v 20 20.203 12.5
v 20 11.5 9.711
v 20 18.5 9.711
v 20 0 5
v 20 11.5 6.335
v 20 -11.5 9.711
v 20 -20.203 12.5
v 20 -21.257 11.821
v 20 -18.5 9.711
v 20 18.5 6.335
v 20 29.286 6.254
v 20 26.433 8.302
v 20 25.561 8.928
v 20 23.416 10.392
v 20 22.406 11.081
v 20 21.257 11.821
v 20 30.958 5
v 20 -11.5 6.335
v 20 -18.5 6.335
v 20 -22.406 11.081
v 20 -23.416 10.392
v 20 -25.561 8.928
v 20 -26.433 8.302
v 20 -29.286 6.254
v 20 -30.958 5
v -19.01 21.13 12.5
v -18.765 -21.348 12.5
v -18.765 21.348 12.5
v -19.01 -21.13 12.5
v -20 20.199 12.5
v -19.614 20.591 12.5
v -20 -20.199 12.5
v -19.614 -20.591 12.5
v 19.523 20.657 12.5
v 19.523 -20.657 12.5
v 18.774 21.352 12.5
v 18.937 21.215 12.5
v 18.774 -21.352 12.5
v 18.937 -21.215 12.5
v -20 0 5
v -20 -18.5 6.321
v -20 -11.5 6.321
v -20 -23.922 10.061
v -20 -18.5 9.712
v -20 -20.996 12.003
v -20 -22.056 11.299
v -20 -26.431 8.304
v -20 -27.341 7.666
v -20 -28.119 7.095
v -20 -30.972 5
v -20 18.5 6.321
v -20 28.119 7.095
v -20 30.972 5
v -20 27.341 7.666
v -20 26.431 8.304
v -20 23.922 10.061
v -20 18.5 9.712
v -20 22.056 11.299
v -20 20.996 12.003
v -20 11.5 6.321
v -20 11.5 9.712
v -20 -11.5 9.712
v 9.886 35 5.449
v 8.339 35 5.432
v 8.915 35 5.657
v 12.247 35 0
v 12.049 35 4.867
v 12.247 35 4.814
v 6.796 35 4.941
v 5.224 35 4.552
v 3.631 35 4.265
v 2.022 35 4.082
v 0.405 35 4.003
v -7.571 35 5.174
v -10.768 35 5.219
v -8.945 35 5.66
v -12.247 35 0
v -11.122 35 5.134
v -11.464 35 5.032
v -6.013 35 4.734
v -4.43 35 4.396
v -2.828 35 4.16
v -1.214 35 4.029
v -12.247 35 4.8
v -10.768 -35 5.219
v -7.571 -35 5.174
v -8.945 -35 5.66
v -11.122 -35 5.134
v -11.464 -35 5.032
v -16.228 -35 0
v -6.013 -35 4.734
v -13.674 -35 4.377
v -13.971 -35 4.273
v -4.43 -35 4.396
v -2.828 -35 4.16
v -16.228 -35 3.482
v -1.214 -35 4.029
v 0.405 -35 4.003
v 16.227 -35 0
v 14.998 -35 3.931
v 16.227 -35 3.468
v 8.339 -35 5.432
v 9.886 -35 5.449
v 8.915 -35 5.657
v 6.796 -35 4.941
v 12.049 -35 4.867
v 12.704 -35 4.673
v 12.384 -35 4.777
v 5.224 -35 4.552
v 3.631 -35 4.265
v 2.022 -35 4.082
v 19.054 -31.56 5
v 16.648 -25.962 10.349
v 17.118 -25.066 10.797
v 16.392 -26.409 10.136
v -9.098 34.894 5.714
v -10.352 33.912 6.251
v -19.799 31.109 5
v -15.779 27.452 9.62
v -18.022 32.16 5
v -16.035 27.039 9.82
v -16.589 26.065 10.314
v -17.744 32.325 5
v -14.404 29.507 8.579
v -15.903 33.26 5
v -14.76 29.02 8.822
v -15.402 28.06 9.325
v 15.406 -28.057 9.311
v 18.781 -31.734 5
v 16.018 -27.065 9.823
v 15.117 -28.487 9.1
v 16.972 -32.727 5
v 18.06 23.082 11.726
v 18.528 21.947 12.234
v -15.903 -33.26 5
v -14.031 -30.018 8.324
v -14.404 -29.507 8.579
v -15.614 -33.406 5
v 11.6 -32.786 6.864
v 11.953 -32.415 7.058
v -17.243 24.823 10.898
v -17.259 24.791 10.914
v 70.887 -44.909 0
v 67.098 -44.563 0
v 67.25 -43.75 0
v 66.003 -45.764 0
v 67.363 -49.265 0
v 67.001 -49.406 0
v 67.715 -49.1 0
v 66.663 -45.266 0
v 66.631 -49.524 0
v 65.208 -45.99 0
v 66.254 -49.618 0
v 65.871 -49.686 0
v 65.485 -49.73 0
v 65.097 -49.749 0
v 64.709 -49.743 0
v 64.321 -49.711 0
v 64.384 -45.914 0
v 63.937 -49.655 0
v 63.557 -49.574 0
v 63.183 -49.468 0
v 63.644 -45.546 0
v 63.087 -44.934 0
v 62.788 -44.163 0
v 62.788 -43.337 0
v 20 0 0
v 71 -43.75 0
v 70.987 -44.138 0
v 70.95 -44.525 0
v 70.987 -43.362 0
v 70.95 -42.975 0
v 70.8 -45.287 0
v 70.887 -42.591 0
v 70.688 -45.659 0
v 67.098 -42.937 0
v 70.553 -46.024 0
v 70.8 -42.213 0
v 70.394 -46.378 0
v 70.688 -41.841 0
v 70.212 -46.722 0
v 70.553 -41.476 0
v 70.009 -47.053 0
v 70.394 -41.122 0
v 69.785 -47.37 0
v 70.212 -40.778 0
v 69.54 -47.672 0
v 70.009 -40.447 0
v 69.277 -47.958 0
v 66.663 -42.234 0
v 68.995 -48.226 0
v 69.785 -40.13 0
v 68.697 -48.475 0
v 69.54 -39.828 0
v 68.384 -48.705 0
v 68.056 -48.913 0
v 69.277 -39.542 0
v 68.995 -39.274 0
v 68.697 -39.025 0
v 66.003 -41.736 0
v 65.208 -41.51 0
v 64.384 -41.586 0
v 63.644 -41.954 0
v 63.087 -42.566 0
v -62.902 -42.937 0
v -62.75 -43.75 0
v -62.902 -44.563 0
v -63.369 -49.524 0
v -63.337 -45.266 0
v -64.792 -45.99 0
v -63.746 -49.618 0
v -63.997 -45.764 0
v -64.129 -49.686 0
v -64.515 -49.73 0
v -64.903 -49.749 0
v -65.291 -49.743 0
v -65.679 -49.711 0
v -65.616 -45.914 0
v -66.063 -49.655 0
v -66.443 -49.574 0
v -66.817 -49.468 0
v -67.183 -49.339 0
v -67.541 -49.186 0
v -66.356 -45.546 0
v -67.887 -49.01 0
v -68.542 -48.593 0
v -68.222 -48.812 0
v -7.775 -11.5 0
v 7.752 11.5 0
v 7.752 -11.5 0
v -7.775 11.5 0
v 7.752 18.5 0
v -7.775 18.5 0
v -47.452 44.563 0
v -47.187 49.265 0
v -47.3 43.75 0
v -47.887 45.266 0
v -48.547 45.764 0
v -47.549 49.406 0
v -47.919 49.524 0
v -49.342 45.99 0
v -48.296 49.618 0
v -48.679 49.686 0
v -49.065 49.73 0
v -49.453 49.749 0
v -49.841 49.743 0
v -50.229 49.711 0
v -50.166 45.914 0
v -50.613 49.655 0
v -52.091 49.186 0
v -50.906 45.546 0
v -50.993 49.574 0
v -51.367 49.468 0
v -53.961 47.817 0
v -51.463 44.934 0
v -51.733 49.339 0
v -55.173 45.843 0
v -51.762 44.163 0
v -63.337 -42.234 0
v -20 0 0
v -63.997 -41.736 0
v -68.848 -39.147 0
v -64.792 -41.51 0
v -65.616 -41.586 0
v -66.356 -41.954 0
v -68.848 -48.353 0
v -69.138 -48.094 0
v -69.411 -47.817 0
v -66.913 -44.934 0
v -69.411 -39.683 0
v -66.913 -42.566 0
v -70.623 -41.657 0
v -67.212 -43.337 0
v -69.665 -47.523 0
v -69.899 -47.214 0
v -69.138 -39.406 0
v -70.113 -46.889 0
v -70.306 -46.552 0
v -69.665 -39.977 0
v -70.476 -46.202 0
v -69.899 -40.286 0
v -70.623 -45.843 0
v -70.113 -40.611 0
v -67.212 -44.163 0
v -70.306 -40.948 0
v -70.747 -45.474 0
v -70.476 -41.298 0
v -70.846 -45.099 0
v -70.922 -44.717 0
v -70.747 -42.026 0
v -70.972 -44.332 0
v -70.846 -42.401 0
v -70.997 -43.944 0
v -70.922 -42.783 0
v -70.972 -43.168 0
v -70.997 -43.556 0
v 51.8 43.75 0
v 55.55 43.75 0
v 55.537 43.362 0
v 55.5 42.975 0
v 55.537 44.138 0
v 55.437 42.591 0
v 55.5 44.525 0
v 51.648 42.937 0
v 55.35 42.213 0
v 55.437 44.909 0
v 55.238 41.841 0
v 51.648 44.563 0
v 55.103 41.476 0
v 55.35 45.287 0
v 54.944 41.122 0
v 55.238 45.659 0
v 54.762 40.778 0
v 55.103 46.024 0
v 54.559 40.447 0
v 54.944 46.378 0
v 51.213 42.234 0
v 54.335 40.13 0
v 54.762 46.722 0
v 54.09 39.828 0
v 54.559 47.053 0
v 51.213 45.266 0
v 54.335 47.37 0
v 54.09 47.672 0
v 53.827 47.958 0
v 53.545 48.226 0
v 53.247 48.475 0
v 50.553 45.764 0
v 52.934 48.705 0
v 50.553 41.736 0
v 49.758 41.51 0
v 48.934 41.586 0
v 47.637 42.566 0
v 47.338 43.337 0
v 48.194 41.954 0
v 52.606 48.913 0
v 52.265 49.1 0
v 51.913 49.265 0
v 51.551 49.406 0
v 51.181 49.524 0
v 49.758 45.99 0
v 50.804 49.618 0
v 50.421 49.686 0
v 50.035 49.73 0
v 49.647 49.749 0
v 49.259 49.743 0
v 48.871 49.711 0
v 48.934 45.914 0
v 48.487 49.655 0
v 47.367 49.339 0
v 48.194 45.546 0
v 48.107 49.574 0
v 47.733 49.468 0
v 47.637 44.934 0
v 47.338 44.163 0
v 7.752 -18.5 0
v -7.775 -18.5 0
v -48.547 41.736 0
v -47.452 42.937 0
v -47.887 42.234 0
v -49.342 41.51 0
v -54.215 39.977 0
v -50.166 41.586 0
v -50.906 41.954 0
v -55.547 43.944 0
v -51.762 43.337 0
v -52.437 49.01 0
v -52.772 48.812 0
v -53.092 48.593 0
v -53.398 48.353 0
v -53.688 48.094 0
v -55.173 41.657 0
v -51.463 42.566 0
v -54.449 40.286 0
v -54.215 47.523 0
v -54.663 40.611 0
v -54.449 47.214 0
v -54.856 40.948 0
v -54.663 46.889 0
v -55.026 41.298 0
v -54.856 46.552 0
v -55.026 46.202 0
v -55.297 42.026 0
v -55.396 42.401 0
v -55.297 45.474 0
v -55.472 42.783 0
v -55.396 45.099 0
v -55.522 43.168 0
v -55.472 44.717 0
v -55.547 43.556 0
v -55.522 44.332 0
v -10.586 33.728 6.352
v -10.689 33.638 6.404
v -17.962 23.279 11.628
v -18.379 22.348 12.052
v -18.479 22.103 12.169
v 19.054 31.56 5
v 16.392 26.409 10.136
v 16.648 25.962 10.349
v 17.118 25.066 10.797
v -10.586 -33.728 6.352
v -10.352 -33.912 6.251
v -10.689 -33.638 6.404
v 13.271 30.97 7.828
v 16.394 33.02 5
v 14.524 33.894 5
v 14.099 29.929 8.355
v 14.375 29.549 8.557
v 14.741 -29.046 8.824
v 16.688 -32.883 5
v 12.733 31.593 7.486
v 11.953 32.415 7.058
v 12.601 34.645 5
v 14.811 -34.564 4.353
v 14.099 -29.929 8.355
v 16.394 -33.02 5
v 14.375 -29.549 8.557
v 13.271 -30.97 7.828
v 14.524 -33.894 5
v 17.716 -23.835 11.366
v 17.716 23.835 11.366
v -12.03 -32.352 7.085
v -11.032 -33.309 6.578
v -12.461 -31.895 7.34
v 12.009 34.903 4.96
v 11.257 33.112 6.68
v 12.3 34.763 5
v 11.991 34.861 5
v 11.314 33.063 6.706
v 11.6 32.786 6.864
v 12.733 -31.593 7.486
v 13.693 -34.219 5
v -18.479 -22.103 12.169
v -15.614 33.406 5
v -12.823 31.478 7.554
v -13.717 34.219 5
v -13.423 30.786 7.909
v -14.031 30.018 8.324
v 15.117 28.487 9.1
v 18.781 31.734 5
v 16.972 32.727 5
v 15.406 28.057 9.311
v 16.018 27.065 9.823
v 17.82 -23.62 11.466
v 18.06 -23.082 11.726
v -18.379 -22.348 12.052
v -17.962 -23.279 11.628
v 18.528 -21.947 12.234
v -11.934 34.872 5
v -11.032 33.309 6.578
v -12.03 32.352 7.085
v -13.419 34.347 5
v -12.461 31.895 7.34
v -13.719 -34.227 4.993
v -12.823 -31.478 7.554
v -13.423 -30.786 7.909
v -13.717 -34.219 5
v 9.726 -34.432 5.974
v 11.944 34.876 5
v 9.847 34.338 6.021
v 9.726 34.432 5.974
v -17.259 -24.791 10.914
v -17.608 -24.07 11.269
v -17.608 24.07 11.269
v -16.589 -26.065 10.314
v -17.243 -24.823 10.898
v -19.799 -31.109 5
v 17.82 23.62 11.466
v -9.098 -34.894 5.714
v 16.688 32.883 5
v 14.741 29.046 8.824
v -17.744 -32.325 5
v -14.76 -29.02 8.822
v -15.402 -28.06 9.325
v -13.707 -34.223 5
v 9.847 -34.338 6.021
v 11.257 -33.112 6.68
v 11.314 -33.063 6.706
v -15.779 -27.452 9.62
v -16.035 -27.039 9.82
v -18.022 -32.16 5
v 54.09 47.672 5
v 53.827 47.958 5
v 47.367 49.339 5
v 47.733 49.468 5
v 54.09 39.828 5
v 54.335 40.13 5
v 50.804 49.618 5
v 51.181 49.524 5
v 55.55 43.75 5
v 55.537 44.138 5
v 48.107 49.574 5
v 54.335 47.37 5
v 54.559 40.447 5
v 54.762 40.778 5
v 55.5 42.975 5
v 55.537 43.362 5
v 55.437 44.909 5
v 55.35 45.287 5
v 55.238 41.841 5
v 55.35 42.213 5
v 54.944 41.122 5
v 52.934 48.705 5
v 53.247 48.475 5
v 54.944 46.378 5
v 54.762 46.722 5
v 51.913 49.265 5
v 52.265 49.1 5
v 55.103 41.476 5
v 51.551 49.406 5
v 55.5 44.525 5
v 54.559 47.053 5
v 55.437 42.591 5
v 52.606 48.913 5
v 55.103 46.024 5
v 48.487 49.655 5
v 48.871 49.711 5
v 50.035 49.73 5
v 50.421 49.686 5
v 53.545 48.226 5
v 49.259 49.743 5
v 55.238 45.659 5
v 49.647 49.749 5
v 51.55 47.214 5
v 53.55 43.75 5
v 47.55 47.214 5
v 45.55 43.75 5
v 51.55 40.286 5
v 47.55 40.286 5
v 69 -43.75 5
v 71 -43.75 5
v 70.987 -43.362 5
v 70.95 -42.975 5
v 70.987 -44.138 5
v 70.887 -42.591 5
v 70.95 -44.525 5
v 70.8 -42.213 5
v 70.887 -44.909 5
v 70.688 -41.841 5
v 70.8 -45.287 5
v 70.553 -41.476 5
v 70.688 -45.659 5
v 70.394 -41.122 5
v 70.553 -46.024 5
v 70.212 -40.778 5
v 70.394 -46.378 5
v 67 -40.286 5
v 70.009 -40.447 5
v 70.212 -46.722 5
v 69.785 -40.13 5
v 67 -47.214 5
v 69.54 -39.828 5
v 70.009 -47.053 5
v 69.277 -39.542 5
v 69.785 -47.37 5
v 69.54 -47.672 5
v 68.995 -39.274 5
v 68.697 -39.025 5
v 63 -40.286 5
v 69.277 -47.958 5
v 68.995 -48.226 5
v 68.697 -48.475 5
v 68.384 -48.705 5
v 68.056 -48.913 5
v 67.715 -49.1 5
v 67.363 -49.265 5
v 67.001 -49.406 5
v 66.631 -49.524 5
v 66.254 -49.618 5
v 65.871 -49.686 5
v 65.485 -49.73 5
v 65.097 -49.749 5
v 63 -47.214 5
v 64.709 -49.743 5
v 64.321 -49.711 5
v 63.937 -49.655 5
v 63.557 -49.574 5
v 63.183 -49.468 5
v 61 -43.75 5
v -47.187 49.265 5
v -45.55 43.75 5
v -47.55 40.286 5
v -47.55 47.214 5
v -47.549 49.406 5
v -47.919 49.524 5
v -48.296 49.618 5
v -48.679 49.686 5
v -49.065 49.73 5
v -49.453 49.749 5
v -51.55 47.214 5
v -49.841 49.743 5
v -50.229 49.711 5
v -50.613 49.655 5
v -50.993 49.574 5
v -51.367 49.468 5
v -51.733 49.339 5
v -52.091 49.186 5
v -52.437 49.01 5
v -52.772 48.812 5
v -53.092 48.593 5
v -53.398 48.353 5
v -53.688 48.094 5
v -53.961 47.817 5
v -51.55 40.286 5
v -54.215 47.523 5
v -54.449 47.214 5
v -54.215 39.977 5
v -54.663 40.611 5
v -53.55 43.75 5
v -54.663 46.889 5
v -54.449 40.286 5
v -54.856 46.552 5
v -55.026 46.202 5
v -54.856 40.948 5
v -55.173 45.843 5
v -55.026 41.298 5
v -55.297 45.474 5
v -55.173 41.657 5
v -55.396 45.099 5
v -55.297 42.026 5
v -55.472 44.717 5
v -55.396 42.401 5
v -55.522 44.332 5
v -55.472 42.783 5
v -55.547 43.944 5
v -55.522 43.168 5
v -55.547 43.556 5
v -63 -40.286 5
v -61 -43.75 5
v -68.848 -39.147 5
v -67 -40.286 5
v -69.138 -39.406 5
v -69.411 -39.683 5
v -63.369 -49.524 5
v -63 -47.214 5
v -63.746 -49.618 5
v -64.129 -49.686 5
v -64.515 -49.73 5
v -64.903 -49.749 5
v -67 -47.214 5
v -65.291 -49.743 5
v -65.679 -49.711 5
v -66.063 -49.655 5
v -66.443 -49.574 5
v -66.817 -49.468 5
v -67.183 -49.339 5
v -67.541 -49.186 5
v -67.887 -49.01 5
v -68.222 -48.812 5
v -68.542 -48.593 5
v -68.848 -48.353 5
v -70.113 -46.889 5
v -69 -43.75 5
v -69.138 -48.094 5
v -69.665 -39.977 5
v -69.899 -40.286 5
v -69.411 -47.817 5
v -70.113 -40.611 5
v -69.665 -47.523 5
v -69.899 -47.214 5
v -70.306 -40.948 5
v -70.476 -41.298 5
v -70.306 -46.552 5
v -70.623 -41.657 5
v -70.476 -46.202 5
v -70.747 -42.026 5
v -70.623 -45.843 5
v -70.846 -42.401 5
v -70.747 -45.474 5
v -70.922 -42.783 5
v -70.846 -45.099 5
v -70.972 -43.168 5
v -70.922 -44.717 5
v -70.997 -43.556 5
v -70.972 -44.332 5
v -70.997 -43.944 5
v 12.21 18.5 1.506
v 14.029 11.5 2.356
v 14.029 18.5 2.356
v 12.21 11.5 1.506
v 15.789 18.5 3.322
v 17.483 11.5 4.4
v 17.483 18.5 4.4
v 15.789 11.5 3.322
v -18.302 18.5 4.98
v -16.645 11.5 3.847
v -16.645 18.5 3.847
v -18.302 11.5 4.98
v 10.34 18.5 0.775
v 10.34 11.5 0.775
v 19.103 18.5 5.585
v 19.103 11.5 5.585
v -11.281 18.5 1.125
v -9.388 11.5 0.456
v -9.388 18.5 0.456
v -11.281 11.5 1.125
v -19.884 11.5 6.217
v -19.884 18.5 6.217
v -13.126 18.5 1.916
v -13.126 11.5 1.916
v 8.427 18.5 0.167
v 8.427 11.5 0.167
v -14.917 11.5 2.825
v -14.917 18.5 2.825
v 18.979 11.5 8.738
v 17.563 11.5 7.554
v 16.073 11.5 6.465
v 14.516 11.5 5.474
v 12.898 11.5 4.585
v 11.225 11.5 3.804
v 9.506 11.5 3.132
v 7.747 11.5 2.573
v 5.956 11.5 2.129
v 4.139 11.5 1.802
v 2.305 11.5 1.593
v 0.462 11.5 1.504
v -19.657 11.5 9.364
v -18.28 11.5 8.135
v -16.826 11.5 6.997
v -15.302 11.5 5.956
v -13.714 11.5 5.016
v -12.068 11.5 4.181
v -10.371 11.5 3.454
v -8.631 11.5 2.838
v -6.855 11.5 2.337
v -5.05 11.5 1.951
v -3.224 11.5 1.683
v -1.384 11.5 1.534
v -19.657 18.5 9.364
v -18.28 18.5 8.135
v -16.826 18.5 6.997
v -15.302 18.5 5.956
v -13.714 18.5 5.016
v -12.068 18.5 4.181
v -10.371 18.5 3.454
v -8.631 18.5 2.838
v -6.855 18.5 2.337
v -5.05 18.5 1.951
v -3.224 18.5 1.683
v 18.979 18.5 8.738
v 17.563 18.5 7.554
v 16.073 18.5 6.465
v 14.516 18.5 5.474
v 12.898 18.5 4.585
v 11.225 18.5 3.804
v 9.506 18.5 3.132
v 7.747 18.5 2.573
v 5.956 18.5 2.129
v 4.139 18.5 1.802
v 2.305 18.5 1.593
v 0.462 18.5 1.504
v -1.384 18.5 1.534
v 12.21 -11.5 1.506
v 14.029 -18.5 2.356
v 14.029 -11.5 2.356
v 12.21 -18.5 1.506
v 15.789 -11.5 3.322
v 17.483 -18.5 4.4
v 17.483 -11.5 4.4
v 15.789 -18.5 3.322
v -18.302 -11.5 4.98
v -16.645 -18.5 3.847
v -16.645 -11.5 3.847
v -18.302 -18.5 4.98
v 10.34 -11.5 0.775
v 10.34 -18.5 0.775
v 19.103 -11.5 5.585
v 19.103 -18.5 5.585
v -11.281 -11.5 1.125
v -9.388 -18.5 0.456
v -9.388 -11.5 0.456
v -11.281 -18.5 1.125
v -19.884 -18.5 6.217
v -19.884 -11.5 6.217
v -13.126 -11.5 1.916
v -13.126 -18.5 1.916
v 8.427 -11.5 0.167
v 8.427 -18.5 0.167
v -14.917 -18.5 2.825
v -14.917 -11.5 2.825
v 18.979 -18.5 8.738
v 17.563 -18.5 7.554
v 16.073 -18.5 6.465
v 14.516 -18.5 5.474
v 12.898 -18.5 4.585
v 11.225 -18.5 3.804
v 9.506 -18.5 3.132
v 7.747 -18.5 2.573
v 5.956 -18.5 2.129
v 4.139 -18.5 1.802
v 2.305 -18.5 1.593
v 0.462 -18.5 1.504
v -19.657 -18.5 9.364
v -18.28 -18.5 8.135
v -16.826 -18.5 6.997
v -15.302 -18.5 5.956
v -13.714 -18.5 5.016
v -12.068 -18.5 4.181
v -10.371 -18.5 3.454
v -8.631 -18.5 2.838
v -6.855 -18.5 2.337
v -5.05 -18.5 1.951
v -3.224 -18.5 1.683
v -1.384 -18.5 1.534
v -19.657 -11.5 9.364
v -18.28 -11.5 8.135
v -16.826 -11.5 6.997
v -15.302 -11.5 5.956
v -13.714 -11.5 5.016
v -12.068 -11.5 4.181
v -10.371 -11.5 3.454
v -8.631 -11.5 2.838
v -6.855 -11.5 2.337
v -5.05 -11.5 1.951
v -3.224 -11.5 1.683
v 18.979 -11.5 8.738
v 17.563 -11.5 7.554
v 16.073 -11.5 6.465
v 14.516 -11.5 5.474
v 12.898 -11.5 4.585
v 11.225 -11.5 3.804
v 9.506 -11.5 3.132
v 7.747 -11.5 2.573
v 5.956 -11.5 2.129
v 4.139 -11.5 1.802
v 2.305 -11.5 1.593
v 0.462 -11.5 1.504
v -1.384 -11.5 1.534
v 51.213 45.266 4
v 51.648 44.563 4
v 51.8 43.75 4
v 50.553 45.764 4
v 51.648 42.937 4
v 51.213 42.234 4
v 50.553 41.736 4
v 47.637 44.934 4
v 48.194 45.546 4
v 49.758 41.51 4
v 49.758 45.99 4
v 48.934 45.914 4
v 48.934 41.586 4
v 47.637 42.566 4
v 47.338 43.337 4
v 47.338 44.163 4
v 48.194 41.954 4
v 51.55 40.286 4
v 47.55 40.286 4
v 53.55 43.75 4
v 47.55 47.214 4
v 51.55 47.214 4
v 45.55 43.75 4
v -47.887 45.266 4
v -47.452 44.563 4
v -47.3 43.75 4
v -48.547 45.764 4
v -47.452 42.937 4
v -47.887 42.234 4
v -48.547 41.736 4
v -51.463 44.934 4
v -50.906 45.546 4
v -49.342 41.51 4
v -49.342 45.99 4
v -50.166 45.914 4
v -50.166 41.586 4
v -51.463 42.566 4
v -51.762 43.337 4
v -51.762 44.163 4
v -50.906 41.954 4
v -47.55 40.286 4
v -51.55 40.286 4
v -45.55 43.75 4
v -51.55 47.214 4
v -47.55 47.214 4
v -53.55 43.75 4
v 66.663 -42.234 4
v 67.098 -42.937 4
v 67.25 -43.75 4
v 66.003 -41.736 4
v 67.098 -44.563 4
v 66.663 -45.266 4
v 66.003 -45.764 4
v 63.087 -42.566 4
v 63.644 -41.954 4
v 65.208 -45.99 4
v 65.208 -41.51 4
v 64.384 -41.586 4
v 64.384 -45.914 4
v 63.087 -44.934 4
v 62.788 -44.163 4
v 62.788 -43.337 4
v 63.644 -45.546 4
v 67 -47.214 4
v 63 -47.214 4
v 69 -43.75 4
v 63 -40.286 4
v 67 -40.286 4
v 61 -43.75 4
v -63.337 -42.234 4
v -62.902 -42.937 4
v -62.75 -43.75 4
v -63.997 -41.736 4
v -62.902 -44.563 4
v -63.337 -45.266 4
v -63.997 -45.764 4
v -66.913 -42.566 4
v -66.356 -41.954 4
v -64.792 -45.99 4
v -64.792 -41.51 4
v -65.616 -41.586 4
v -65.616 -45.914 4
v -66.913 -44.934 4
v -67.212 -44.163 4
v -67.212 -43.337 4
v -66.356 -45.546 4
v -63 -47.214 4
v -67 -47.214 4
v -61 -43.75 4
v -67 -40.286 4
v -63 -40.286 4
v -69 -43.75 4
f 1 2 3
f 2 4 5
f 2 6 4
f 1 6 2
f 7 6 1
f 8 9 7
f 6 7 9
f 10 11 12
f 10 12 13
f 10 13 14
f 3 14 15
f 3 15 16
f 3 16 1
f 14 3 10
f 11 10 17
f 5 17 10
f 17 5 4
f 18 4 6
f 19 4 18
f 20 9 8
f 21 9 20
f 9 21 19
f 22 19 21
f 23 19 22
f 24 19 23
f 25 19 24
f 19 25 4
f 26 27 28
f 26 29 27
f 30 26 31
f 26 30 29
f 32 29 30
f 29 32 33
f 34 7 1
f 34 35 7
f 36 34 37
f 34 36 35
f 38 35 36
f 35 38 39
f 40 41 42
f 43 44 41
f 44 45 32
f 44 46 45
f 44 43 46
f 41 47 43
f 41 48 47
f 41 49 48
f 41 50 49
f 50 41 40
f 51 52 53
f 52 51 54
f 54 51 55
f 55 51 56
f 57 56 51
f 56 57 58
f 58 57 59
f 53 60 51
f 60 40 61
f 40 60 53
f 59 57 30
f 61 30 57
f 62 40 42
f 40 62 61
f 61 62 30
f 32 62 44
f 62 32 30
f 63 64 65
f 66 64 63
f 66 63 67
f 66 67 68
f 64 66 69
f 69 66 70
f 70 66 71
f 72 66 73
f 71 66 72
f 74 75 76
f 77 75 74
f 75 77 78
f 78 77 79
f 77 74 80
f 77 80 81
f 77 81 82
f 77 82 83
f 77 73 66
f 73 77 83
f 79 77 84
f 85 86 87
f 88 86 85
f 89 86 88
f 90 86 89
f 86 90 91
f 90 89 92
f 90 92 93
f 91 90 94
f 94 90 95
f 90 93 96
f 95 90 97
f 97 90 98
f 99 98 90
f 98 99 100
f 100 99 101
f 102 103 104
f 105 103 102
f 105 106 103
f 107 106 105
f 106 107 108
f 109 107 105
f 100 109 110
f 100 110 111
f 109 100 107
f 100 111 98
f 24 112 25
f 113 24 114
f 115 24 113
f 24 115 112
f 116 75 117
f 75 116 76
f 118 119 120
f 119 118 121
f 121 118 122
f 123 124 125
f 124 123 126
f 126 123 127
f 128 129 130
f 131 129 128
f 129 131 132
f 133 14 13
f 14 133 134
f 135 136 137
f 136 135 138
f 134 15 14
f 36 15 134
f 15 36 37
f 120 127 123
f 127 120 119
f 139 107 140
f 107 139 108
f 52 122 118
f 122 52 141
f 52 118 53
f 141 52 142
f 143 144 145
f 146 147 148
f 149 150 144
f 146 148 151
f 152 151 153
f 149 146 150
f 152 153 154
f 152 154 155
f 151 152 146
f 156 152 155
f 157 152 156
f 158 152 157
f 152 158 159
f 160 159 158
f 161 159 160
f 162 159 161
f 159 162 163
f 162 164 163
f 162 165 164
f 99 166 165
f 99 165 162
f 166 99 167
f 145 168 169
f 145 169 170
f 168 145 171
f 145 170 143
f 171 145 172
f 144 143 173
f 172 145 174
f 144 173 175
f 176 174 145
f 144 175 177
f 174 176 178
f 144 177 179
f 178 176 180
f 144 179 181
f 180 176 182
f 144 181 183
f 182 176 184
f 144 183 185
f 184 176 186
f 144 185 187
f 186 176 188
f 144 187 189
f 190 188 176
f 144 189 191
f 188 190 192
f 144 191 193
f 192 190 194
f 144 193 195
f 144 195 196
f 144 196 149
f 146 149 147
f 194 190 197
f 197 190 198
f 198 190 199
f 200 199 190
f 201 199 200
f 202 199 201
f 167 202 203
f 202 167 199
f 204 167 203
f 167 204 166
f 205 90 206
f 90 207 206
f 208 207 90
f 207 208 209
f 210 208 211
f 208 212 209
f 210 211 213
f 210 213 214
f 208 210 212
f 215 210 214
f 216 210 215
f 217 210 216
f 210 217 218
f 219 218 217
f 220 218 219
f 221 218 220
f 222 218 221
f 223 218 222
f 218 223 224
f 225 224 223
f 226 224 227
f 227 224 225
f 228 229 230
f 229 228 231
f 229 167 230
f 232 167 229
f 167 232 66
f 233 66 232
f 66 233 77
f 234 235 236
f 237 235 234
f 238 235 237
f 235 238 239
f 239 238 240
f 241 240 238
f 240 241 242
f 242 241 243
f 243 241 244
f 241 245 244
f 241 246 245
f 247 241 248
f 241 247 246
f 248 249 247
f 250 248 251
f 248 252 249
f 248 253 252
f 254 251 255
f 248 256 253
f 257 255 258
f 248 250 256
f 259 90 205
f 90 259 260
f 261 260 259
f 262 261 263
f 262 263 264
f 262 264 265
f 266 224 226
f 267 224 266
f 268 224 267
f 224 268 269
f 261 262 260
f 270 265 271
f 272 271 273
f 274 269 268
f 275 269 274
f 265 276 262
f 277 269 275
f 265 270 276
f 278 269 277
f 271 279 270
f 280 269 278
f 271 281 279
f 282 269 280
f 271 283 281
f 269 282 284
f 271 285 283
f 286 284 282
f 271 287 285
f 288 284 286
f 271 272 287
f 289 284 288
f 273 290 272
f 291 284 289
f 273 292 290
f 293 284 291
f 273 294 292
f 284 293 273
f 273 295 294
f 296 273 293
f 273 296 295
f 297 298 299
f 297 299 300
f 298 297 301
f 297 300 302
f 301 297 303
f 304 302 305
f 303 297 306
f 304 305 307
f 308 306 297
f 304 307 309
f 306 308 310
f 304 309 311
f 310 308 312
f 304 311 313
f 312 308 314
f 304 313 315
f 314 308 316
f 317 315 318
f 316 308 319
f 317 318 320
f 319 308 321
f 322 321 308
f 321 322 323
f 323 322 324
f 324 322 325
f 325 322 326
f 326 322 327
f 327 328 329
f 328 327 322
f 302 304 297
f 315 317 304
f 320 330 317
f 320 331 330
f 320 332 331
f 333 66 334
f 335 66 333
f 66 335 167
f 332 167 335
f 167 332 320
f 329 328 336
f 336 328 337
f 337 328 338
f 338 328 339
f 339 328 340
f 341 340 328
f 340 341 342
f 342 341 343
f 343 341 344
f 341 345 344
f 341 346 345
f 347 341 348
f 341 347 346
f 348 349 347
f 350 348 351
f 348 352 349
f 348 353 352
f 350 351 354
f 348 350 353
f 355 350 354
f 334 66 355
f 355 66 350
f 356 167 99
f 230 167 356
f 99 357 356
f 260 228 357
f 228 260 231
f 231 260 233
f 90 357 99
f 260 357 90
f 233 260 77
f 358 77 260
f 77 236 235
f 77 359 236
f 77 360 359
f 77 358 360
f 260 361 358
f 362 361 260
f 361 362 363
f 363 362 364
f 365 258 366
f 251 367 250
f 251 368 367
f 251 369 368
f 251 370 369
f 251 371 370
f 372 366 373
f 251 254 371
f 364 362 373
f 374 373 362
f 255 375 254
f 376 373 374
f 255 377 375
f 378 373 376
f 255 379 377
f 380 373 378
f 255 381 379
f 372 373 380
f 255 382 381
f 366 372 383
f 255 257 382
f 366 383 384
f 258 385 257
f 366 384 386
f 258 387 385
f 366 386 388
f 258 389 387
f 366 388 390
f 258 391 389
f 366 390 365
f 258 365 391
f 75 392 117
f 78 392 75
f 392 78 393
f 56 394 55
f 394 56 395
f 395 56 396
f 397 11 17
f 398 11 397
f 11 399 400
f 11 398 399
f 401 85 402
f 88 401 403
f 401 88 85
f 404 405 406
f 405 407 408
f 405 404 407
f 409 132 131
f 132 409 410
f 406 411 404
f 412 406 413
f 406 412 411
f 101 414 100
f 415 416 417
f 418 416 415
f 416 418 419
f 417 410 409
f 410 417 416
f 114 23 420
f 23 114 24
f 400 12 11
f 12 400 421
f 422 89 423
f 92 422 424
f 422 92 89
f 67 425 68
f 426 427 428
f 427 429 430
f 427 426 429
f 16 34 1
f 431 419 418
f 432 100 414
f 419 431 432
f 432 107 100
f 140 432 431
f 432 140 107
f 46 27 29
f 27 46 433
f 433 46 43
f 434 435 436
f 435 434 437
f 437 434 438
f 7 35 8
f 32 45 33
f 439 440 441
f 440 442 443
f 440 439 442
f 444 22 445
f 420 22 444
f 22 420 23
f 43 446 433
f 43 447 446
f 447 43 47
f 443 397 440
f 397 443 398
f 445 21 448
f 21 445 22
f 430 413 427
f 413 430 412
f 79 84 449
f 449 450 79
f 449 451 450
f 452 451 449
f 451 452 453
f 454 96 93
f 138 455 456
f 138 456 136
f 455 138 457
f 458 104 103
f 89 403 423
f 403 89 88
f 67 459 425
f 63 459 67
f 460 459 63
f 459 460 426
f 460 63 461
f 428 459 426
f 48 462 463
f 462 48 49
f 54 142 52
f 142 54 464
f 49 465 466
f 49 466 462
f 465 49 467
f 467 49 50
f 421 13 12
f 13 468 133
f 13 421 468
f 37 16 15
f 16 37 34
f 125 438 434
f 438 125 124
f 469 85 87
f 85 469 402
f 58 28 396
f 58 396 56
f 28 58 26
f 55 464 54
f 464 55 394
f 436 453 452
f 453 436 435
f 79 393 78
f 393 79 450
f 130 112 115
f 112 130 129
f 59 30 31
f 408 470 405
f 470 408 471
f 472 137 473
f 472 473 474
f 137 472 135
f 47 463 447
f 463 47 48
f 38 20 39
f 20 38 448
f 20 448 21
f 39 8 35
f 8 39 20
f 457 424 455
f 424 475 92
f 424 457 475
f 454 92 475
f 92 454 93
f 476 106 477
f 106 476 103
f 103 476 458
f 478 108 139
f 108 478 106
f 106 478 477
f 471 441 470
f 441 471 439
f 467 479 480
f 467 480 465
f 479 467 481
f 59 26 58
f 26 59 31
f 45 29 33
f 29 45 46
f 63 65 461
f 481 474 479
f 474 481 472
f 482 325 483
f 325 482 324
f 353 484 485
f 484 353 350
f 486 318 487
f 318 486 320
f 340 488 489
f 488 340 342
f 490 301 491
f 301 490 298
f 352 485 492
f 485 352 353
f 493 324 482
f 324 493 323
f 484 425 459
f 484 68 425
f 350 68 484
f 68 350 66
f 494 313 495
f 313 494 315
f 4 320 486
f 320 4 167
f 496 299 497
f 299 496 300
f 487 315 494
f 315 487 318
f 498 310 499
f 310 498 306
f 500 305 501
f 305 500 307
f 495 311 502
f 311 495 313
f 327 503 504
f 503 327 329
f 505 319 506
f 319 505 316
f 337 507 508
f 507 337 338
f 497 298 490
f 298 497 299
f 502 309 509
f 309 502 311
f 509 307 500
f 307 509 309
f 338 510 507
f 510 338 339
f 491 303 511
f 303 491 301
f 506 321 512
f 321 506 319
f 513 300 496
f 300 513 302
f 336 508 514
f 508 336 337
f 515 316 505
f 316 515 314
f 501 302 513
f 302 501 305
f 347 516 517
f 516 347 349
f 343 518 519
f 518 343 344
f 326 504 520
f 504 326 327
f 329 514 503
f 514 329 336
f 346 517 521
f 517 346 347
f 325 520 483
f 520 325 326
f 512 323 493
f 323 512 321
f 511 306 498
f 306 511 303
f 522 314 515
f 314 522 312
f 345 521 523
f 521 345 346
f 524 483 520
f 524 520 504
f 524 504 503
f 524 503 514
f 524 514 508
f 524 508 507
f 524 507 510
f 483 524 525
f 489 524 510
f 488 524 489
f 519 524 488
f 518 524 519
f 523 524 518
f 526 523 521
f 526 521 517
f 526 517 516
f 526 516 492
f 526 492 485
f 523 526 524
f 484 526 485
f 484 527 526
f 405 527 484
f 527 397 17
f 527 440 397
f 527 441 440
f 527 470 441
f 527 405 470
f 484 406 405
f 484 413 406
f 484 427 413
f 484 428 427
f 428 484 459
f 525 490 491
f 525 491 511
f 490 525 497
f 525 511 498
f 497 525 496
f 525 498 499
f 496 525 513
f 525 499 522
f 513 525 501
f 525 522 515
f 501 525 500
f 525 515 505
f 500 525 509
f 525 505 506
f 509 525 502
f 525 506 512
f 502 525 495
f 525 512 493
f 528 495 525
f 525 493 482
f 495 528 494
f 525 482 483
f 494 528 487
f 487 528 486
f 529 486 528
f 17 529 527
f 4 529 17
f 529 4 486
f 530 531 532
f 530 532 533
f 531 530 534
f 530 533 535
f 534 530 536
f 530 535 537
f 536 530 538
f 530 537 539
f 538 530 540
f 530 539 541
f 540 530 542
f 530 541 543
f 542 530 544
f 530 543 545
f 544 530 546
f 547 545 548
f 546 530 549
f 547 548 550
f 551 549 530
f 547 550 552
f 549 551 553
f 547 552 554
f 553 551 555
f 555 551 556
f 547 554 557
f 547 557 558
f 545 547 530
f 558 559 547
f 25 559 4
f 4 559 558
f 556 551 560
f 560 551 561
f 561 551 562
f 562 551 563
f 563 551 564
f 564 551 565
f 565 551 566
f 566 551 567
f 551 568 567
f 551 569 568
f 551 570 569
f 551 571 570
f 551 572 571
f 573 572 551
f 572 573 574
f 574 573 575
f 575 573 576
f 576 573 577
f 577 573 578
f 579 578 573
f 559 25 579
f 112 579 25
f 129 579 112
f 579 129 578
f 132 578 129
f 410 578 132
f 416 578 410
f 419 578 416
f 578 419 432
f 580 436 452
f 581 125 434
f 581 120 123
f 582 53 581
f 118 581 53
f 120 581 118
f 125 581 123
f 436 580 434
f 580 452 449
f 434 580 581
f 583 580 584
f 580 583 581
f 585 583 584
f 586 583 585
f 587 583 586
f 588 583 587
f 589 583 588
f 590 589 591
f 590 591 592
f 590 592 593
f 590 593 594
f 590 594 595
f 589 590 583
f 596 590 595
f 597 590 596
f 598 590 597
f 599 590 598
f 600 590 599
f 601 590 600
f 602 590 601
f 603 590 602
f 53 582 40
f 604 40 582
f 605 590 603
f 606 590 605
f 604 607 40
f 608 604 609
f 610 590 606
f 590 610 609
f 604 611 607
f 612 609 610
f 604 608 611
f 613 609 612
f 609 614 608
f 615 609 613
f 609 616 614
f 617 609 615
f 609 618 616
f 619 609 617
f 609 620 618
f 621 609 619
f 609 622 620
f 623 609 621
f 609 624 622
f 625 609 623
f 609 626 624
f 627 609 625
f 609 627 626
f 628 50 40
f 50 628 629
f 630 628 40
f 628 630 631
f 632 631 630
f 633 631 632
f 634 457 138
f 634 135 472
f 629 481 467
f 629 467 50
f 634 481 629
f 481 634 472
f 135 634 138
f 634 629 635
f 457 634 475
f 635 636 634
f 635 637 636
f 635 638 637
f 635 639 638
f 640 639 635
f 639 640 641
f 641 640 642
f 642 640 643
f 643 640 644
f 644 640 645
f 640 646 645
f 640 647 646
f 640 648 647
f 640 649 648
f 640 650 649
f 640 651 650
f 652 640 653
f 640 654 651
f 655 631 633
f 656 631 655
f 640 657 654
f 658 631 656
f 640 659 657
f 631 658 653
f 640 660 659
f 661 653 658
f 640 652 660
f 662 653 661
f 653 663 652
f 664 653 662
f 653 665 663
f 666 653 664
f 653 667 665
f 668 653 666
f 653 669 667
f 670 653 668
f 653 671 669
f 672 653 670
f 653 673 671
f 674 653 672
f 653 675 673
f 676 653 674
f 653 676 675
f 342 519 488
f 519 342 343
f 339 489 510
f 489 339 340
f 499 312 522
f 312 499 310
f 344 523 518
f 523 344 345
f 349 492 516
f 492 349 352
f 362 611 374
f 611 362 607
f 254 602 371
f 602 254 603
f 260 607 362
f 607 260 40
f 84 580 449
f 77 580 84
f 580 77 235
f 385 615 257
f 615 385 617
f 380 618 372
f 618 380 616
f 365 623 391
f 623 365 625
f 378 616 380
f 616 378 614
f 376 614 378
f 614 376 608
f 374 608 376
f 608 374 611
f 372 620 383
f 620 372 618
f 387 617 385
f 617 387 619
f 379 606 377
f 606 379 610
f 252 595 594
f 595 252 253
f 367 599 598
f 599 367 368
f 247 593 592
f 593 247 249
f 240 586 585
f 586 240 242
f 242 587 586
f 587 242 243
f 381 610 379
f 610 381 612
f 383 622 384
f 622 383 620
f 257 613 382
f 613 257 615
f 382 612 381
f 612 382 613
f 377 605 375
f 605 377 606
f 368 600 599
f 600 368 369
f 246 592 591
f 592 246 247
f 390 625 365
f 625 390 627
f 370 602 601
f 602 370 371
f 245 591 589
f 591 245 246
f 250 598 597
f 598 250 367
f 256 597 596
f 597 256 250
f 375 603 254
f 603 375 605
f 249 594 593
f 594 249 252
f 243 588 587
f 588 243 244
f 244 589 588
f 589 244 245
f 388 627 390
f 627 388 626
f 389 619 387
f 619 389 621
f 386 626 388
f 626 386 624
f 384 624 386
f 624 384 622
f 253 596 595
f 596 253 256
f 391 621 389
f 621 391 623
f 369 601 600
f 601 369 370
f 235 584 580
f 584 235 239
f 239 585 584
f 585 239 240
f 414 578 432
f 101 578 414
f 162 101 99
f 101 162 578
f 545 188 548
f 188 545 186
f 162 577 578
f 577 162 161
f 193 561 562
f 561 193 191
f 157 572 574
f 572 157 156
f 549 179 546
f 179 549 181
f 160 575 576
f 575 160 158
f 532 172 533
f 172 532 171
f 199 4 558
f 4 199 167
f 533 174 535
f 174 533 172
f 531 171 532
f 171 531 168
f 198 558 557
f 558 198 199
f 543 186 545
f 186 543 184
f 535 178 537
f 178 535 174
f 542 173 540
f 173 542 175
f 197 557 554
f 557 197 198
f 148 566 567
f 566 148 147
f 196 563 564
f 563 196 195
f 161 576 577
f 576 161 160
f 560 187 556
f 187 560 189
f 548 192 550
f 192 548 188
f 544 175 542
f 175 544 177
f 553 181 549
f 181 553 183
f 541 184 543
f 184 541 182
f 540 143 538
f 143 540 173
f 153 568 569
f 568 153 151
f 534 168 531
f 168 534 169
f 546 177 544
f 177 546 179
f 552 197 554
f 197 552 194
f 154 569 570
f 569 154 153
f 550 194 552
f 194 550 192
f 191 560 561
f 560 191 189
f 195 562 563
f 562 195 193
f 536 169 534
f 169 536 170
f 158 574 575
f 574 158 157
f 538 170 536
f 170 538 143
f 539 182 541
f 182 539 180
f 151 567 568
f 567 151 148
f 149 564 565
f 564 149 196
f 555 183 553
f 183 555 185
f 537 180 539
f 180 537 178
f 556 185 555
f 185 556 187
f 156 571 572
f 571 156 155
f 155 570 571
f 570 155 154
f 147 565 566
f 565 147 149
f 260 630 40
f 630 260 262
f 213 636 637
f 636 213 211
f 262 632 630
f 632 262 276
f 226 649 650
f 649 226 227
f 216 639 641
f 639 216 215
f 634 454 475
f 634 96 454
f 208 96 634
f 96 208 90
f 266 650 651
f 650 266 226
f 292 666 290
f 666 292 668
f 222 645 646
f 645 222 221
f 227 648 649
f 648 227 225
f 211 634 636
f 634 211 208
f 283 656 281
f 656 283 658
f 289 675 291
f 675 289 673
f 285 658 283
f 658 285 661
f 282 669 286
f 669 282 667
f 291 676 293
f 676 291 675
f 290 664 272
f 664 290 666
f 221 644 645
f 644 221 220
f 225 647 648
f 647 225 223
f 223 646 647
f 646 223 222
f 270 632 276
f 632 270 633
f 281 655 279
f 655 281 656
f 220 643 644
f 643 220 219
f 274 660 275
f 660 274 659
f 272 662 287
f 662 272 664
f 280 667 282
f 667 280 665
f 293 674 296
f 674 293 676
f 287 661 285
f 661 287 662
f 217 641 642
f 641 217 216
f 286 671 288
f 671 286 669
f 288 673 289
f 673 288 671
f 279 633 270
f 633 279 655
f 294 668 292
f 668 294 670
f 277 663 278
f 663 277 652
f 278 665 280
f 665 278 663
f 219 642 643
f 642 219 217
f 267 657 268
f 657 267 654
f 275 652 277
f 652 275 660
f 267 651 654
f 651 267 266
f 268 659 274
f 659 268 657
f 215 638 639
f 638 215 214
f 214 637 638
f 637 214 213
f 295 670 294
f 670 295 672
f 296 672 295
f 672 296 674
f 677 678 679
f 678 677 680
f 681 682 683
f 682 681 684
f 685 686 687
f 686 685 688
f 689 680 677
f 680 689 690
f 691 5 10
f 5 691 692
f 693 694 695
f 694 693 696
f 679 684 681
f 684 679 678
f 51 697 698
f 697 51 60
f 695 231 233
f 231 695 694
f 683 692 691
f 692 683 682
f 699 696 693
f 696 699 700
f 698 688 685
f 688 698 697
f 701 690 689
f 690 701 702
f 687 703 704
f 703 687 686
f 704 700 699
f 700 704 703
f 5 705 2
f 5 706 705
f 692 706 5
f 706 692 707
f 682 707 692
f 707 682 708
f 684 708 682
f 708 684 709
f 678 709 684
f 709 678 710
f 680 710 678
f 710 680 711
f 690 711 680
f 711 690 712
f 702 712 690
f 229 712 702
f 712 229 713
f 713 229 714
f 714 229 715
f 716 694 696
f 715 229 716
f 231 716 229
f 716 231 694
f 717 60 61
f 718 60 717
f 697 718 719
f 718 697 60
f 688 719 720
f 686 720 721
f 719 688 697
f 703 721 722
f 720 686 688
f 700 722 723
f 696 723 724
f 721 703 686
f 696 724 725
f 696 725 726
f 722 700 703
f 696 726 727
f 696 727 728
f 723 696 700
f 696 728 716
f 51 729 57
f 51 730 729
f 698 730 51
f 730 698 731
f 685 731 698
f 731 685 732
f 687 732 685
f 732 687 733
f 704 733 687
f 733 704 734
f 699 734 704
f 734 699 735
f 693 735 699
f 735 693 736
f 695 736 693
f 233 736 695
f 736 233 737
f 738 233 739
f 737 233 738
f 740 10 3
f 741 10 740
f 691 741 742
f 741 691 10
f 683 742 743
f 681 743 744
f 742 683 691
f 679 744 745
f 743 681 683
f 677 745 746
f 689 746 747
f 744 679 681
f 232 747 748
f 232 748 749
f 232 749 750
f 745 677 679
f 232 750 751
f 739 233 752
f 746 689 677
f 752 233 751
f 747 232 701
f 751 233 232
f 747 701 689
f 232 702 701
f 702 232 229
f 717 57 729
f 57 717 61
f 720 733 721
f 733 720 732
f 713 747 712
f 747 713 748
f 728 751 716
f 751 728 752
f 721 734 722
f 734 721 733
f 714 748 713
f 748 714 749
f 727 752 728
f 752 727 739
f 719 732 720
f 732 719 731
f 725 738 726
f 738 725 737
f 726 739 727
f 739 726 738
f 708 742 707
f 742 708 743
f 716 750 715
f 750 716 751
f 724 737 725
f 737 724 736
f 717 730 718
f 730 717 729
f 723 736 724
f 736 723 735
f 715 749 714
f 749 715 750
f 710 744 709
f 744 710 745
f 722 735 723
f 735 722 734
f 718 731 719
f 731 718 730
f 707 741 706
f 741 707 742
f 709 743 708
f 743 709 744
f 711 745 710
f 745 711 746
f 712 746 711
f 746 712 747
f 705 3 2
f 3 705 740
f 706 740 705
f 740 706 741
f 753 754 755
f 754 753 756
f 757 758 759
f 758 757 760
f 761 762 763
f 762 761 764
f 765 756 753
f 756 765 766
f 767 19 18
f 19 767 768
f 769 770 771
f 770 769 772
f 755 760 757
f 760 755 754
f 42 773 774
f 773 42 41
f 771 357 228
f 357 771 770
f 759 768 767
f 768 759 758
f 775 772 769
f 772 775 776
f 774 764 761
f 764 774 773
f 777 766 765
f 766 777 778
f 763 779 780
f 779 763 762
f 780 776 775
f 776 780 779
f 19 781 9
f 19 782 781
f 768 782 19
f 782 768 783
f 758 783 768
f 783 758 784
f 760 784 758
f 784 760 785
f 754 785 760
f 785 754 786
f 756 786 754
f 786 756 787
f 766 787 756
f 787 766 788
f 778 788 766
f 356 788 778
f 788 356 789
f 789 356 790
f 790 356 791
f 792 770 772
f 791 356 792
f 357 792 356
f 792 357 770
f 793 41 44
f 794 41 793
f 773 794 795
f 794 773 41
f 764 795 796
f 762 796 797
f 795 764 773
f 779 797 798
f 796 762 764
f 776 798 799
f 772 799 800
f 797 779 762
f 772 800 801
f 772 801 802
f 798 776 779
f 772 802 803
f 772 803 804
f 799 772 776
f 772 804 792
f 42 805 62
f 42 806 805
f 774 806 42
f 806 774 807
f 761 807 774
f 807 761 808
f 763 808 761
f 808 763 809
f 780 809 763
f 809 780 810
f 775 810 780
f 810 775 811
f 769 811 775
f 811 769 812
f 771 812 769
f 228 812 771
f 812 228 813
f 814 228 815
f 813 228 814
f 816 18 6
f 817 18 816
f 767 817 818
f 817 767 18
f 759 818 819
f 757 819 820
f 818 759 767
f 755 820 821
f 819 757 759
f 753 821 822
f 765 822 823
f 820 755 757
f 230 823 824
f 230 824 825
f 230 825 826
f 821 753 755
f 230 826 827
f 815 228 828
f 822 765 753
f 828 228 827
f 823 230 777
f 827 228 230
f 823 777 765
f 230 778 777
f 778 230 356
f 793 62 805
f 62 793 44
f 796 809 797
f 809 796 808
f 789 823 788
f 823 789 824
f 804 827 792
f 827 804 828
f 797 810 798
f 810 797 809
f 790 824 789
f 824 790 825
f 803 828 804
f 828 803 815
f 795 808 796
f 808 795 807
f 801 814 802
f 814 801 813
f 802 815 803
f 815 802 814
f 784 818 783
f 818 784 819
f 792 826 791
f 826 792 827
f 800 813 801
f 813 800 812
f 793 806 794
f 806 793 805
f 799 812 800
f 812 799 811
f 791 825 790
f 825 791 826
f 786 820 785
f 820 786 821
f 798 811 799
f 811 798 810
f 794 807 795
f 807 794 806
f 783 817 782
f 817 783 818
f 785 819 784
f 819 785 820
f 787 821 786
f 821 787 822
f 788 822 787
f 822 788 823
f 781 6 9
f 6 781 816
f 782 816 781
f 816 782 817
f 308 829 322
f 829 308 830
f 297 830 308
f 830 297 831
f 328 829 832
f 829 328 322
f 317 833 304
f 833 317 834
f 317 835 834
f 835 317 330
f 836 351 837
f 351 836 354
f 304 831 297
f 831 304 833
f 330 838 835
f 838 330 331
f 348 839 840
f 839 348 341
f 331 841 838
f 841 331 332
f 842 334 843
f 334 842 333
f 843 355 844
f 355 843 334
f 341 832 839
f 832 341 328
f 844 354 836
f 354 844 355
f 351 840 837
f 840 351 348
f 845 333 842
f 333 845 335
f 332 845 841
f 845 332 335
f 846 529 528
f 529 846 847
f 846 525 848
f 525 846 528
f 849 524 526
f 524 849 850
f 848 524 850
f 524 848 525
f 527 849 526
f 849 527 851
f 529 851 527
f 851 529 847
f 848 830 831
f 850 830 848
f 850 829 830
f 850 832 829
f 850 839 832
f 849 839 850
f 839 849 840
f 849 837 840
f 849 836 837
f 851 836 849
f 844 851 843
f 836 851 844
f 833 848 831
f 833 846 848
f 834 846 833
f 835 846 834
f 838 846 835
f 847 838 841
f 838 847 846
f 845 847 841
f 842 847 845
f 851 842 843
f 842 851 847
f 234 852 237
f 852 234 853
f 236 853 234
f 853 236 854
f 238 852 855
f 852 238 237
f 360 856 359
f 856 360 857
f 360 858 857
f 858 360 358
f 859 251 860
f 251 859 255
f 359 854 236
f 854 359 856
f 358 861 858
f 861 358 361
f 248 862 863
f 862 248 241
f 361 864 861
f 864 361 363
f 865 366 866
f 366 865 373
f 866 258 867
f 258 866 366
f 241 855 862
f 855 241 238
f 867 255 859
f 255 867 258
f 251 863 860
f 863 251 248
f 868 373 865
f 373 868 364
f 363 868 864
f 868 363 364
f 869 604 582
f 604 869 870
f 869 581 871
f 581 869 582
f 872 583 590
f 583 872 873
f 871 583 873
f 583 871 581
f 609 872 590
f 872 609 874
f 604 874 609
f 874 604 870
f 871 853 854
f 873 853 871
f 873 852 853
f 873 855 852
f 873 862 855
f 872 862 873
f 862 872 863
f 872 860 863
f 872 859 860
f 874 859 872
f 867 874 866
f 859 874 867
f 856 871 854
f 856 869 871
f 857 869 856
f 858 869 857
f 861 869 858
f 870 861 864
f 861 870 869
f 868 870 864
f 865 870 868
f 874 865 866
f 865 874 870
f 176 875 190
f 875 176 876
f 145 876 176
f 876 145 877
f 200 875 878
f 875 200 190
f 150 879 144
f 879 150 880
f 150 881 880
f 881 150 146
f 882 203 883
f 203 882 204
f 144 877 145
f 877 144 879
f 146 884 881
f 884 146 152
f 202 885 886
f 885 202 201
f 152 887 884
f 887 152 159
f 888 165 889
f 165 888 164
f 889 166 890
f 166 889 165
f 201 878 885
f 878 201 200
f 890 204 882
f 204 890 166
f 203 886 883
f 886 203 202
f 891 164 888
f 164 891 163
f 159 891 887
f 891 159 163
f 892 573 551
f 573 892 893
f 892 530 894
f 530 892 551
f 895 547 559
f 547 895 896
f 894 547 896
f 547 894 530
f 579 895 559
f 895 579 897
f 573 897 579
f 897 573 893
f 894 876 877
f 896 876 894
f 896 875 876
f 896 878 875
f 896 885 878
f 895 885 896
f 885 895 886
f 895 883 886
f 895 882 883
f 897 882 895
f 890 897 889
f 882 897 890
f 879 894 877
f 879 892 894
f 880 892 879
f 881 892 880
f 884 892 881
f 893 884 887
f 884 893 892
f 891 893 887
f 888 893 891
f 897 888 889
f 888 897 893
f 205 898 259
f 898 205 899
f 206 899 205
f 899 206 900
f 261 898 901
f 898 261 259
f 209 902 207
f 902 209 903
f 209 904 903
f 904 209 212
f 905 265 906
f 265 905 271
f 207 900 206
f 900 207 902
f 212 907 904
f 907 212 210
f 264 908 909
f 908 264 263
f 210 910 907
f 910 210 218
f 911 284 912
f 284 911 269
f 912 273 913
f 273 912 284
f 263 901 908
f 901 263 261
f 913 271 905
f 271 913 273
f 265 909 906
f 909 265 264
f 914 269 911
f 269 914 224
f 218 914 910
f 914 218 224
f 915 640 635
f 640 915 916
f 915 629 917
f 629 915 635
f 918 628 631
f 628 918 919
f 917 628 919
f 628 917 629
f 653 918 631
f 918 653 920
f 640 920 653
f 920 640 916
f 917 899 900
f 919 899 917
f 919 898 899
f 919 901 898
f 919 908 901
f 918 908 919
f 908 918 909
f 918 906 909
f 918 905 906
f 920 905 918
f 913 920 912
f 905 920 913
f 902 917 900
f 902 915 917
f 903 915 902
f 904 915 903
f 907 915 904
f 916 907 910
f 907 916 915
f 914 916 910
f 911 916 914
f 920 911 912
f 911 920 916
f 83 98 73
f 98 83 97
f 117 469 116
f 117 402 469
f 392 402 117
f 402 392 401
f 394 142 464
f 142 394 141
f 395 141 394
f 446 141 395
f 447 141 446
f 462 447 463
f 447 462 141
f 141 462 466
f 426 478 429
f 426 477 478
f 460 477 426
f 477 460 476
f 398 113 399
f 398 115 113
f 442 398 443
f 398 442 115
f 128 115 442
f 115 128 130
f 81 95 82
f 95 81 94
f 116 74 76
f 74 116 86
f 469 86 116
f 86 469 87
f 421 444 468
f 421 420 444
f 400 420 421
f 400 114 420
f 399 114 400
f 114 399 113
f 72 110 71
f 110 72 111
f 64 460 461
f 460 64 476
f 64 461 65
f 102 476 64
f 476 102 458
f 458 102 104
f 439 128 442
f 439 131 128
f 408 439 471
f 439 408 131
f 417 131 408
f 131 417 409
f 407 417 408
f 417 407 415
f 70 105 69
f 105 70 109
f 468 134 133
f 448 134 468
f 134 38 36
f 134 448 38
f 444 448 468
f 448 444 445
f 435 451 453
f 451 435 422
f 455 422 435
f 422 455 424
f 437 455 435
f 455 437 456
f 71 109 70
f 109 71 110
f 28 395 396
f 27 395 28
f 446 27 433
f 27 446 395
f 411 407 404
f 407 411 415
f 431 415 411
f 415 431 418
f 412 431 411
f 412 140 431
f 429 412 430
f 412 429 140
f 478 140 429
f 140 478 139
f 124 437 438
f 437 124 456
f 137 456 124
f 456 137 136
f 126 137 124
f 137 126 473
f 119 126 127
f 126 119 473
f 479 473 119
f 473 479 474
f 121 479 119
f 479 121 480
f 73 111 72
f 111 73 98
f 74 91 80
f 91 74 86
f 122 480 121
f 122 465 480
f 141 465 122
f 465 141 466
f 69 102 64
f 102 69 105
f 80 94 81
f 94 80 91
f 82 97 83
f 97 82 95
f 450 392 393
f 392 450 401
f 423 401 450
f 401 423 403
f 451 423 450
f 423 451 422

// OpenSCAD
pole_diameter = 50; //[20, 30, 40, 50, 60]

module mounting_holes() {
// d=4 is too large, need something to hold or nuts
	translate([99.1/2, 87.5/2, 0]) children();
	translate([-99.1/2, 87.5/2, 0]) children();

	#translate([130/2, -87.5/2, 0]) children();
	translate([-130/2, -87.5/2, 0]) children();
}

debug = 0;

module mount(pole_diameter) {
	$fn=97;
	p=[99.1/2, 87.5/2];
	p1=[130/2, 87.5/2];
	difference () {
		union() {
			intersection() {
				l=70;
				cube([pole_diameter*.8, l, 25], center=true);
				cylinder(d1=l+15, d2=40, h=20);
			}

			arm_end_height = 5;
			// arm 1
			hull() {
				translate([p[0], p[1], 0])
				cylinder(d=12, h=arm_end_height);

				cube([20, 30, arm_end_height]);
			}
			// arm 2
			hull() {
				translate([-p[0], p[1], 0])
				cylinder(d=12, h=arm_end_height);

				translate([-20, 0, 0])
				cube([20, 30, arm_end_height]);
			}
			// arm 3
			hull() {
				translate([p1[0], -p1[1], 0])
				cylinder(d=12, h=arm_end_height);

				translate([0,-30,0])
				cube([20, 30, arm_end_height]);
			}
			// arm 4
			hull() {
				translate([-p1[0], -p1[1], 0])
				cylinder(d=12, h=arm_end_height);

				translate([-20,-30,0])
				cube([20, 30, arm_end_height]);
			}
		}

		// the pole itself
		translate([0,0,pole_diameter/2 + 4])
		rotate([90, 0, 0])
		cylinder(d=pole_diameter, h=90, center=true);

		// ziptie 1
		translate([0, 15, 5 + pole_diameter/2])
		rotate([90,0,0])
		difference () {
			cylinder(d=pole_diameter + 12, h=7, center=true);
			cylinder(d=pole_diameter + 7, h=7, center=true);
		}

		// ziptie 2
		translate([0, -15, 5 + pole_diameter/2])
		rotate([90,0,0])
		difference () {
			cylinder(d=pole_diameter + 12, h=7, center=true);
			cylinder(d=pole_diameter + 7, h=7, center=true);
		}

		mounting_holes() {
			cylinder(d=4.5, h=8, $fn=17);
			translate([0,0,4])
			cylinder(d=8, h=7, $fn=6);
		}
	}
}

mount(pole_diameter);

if (debug) {
	translate([0, 97.5/2, 0])
	#cube([1000, 0.1, 1000], center=true);

	translate([0, -97.5/2, 0])
	#cube([1000, 0.1, 1000], center=true);

	translate([-99.1/2, 0, 0])
	#cube([0.1, 1000, 1000], center=true);

	translate([-125.5/2, 0, 0])
	#cube([0.1, 1000, 1000], center=true);
}
